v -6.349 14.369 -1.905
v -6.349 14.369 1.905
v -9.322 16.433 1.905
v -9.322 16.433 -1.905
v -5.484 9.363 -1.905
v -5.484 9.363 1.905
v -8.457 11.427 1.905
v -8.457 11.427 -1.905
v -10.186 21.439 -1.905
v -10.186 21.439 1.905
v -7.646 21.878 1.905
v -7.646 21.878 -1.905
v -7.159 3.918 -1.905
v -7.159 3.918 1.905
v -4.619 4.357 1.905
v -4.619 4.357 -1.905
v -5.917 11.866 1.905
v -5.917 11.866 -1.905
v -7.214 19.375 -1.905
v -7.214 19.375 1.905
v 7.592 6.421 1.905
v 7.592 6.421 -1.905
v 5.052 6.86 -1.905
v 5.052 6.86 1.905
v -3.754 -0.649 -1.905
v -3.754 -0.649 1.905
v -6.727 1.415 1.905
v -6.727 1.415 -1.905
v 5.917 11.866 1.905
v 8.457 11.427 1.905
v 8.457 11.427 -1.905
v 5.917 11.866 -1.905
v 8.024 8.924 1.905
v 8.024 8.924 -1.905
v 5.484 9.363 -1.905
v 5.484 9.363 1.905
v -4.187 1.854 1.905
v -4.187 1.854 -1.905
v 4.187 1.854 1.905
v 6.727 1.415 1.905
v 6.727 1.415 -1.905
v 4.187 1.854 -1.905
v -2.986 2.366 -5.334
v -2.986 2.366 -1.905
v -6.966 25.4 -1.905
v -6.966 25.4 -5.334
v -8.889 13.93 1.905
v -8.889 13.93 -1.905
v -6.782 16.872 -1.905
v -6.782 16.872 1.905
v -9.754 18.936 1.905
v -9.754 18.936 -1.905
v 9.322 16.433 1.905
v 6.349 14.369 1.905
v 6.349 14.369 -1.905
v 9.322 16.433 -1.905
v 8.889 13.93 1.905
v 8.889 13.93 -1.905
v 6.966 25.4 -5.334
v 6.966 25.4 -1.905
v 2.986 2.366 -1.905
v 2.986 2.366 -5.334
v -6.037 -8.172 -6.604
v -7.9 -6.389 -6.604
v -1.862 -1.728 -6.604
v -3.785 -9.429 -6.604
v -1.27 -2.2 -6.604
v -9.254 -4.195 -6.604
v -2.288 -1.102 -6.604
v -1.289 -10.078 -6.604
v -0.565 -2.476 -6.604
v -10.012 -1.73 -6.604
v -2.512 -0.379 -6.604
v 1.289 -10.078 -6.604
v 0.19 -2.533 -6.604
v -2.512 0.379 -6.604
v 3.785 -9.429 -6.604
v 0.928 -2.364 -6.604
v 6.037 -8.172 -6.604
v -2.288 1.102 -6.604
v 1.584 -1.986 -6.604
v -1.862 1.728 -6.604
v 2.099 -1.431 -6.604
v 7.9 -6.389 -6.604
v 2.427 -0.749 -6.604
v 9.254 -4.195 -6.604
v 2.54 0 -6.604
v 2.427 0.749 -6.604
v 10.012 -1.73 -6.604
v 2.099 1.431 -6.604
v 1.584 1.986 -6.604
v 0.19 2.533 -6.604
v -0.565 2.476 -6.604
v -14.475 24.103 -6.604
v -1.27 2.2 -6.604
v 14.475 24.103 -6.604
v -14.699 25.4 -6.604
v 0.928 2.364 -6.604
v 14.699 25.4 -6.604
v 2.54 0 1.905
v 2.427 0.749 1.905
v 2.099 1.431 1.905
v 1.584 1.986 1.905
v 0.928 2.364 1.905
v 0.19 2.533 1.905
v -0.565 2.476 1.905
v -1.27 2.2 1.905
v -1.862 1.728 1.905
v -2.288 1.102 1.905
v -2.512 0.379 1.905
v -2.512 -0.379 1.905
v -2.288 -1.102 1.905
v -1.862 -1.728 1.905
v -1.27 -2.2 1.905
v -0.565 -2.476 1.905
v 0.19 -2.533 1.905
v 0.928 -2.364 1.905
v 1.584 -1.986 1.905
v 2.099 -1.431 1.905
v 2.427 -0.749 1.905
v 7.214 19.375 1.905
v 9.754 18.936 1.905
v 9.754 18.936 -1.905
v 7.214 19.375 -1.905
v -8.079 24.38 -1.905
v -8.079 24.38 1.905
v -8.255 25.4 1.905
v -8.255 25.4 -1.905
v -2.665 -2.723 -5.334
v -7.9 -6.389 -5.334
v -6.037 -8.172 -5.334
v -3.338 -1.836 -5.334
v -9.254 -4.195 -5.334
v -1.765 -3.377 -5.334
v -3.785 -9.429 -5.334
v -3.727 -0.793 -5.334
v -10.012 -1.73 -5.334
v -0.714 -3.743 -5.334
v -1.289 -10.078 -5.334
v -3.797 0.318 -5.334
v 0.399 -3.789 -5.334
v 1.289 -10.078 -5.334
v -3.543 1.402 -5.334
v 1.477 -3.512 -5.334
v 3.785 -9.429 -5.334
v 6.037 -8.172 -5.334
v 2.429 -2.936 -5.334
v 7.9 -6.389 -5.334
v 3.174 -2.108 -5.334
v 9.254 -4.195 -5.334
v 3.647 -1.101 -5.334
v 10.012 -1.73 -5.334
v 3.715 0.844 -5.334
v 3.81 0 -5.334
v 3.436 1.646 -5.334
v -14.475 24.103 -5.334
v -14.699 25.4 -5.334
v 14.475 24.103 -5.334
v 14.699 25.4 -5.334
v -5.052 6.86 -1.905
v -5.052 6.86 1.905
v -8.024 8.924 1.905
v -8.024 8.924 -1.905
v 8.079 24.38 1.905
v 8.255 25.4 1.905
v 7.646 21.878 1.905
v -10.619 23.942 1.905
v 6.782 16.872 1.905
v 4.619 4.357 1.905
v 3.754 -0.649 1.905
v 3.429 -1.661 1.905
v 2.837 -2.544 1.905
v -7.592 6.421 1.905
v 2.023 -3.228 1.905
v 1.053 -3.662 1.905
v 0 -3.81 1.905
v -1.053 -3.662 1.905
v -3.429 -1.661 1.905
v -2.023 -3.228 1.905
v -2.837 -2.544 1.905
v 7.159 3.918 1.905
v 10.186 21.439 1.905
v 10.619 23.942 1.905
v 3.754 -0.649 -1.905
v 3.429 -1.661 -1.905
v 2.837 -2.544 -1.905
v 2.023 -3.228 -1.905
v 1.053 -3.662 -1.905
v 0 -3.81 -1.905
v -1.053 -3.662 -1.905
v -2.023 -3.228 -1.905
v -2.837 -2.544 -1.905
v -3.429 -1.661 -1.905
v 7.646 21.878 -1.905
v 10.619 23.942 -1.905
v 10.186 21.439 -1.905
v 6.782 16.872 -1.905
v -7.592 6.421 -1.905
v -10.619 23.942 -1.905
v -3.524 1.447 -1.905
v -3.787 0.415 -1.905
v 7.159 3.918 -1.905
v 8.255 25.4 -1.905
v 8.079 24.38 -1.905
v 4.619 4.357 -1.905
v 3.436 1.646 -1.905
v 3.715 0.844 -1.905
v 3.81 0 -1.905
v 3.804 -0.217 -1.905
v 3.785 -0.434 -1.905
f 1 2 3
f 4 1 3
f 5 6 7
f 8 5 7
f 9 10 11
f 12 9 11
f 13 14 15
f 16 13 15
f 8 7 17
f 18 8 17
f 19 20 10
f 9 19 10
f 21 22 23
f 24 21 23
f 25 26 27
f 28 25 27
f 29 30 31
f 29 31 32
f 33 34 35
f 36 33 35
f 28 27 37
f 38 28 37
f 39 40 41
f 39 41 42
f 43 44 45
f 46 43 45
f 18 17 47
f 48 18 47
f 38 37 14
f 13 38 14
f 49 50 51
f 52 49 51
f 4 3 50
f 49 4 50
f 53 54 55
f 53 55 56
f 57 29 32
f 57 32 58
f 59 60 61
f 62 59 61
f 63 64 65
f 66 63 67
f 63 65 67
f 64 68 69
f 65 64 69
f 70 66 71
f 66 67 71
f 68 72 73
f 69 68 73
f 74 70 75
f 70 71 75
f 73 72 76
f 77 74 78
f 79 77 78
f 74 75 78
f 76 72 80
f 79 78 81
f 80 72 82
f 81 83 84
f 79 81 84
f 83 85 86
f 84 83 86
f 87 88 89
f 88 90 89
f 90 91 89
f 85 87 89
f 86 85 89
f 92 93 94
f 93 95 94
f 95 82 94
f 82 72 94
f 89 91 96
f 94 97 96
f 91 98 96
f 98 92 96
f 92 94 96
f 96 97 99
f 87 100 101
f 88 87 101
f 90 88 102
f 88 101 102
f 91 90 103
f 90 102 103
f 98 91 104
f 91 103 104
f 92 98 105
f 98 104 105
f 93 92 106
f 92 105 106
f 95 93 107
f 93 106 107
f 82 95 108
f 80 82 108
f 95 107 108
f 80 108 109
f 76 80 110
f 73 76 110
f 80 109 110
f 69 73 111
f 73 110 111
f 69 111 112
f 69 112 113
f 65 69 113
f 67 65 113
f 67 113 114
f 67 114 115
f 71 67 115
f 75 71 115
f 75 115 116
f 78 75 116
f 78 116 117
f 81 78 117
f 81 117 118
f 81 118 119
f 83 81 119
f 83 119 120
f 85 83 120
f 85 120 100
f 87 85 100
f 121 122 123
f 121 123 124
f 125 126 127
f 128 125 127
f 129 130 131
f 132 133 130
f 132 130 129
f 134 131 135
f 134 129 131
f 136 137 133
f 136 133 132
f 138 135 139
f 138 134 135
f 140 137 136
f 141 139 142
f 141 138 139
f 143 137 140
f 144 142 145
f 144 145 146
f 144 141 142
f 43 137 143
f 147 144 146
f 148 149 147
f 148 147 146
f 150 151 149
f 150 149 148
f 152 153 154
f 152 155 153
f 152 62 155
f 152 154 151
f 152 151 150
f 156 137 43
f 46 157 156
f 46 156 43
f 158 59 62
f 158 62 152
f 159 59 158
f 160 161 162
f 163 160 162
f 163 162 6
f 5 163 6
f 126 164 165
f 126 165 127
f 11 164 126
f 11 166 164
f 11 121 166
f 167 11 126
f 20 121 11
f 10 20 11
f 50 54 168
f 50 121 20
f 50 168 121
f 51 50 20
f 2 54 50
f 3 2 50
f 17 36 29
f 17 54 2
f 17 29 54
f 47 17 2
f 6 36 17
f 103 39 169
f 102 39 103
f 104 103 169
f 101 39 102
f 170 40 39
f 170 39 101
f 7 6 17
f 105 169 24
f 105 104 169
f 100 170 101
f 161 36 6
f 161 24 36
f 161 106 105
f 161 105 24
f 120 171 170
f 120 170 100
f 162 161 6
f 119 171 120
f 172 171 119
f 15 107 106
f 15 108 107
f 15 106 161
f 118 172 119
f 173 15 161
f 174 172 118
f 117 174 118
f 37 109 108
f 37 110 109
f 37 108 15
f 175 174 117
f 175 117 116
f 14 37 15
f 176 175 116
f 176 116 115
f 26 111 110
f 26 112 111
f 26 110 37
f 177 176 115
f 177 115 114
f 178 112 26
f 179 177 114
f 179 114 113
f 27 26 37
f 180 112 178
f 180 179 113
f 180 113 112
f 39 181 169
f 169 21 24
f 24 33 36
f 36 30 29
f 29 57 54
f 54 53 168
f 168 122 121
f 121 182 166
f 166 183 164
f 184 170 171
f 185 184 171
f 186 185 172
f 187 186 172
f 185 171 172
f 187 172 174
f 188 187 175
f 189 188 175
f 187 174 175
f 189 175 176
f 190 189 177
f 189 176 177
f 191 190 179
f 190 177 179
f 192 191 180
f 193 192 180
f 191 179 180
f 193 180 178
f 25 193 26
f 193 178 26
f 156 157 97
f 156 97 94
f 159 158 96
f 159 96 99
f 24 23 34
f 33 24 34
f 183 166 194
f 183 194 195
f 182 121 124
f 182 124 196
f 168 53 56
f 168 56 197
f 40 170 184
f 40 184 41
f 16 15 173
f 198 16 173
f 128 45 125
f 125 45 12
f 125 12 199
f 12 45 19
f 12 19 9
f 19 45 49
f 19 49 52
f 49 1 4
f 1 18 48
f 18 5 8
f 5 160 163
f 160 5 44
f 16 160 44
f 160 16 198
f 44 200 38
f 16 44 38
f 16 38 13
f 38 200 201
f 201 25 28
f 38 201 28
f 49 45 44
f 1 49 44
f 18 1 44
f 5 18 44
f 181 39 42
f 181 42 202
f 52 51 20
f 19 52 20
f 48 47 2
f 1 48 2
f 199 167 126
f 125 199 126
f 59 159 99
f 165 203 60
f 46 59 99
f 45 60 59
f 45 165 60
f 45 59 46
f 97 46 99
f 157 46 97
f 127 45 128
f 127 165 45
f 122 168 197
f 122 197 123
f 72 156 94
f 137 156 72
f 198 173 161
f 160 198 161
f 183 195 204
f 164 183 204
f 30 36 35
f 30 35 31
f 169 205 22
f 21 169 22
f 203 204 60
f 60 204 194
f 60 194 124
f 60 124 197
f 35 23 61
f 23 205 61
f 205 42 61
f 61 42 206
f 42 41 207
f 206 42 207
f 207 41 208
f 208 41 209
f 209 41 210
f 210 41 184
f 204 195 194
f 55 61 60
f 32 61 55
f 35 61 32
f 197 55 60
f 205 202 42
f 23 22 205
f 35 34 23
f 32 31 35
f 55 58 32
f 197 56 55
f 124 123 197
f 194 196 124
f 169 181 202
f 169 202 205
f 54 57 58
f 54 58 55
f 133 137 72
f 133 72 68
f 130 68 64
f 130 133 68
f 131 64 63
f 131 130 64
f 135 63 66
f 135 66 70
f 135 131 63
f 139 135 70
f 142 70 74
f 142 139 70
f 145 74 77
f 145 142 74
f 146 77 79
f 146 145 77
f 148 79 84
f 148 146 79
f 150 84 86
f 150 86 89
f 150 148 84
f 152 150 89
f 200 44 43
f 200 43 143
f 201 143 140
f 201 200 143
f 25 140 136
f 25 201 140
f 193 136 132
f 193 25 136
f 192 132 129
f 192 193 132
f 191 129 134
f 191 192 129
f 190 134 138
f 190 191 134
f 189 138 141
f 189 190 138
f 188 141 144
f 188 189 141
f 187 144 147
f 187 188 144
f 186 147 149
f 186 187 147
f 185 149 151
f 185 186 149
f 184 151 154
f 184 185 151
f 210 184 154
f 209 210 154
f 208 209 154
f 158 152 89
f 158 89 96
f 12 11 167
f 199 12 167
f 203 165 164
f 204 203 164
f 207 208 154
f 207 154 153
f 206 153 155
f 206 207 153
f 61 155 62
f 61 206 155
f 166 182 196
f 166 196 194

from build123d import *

# Parameters (mm, degrees)
BOSS_EXTRUDE1_DEPTH  = 1.905
BOSS_EXTRUDE3_DEPTH  = 3.429
BOSS_EXTRUDE2_DEPTH  = 3.81
LPATTERN1_COUNT      = 10
LPATTERN1_PITCH      = 2.54
MIRROR1_COPY_1_DEPTH = 3.81
MIRROR1_COPY_2_DEPTH = 3.81
MIRROR1_COPY_3_DEPTH = 3.81
MIRROR1_COPY_4_DEPTH = 3.81
MIRROR1_COPY_5_DEPTH = 3.81
MIRROR1_COPY_6_DEPTH = 3.81
MIRROR1_COPY_7_DEPTH = 3.81
MIRROR1_COPY_8_DEPTH = 3.81
MIRROR1_COPY_9_DEPTH = 3.81
BOSS_EXTRUDE4_DEPTH  = 1.27
SKETCH5_R            = 2.54
CUT_EXTRUDE1_DEPTH   = 31.555296323
SKETCH6_R            = 3.81
SKETCH6_R_2          = 2.54
BOSS_EXTRUDE5_DEPTH  = 7.62


with BuildPart() as part:
    # Sketch1 → Boss-Extrude1 (new, symmetric)
    with BuildSketch(Plane.XY):
        with BuildLine():
            Line((-3.754374137, -0.648671595), (-8.255, 25.4))
            Line((-8.255, 25.4), (8.255, 25.4))
            Line((8.255, 25.4), (3.754374137, -0.648671595))
            ThreePointArc((3.754374137, -0.648671595), (0, -3.81), (-3.754374137, -0.648671595))
        make_face()
    extrude(amount=BOSS_EXTRUDE1_DEPTH, both=True)

    # Sketch3 → Boss-Extrude3 (add)
    with BuildSketch(Plane(origin=(0, 0, -1.905), x_dir=(-1, 0, 0), z_dir=(0, 0, -1))):
        with BuildLine():
            Line((6.966183323, 25.4), (-6.966183323, 25.4))
            Line((-6.966183323, 25.4), (-2.502916091, -0.43244773))
            ThreePointArc((-2.502916091, -0.43244773), (0, -2.54), (2.502916091, -0.43244773))
            Line((2.502916091, -0.43244773), (6.966183323, 25.4))
        make_face()
    extrude(amount=BOSS_EXTRUDE3_DEPTH)

    # Sketch2 → Boss-Extrude2 (add)
    with BuildSketch(Plane.XY.offset(1.905)):
        Polygon((-3.754374137, -0.648671595), (-6.726821867, 1.4153895), (-4.186821867, 1.854244497), align=None)
    boss_extrude2 = extrude(amount=-BOSS_EXTRUDE2_DEPTH)

    # LPattern1: Boss-Extrude2 ×10
    with Locations(*[Vector(-0.17025501170659457, 0.9854000360202892, 0) * (i * LPATTERN1_PITCH) for i in range(1, LPATTERN1_COUNT)]):
        add(boss_extrude2)

    # Mirror1: Boss-Extrude2 across plane
    add(boss_extrude2.mirror(Plane(origin=(0, 0, 0), x_dir=(0, 0, 1), z_dir=(1, 0, 0))))

    # Mirror1 copy 1 sketch → Mirror1 copy 1 (add)
    with BuildSketch(Plane(origin=(0.43244773, 2.502916091, 1.905), x_dir=(-1, 0, 0), z_dir=(0, 0, 1))):
        Polygon((-3.754374137, 0.648671595), (-6.726821867, -1.4153895), (-4.186821867, -1.854244497), align=None)
    extrude(amount=-MIRROR1_COPY_1_DEPTH)

    # Mirror1 copy 2 sketch → Mirror1 copy 2 (add)
    with BuildSketch(Plane(origin=(0.864895459, 5.005832183, 1.905), x_dir=(-1, 0, 0), z_dir=(0, 0, 1))):
        Polygon((-3.754374137, 0.648671595), (-6.726821867, -1.4153895), (-4.186821867, -1.854244497), align=None)
    extrude(amount=-MIRROR1_COPY_2_DEPTH)

    # Mirror1 copy 3 sketch → Mirror1 copy 3 (add)
    with BuildSketch(Plane(origin=(1.297343189, 7.508748274, 1.905), x_dir=(-1, 0, 0), z_dir=(0, 0, 1))):
        Polygon((-3.754374137, 0.648671595), (-6.726821867, -1.4153895), (-4.186821867, -1.854244497), align=None)
    extrude(amount=-MIRROR1_COPY_3_DEPTH)

    # Mirror1 copy 4 sketch → Mirror1 copy 4 (add)
    with BuildSketch(Plane(origin=(1.729790919, 10.011664366, 1.905), x_dir=(-1, 0, 0), z_dir=(0, 0, 1))):
        Polygon((-3.754374137, 0.648671595), (-6.726821867, -1.4153895), (-4.186821867, -1.854244497), align=None)
    extrude(amount=-MIRROR1_COPY_4_DEPTH)

    # Mirror1 copy 5 sketch → Mirror1 copy 5 (add)
    with BuildSketch(Plane(origin=(2.162238649, 12.514580457, 1.905), x_dir=(-1, 0, 0), z_dir=(0, 0, 1))):
        Polygon((-3.754374137, 0.648671595), (-6.726821867, -1.4153895), (-4.186821867, -1.854244497), align=None)
    extrude(amount=-MIRROR1_COPY_5_DEPTH)

    # Mirror1 copy 6 sketch → Mirror1 copy 6 (add)
    with BuildSketch(Plane(origin=(2.594686378, 15.017496549, 1.905), x_dir=(-1, 0, 0), z_dir=(0, 0, 1))):
        Polygon((-3.754374137, 0.648671595), (-6.726821867, -1.4153895), (-4.186821867, -1.854244497), align=None)
    extrude(amount=-MIRROR1_COPY_6_DEPTH)

    # Mirror1 copy 7 sketch → Mirror1 copy 7 (add)
    with BuildSketch(Plane(origin=(3.027134108, 17.52041264, 1.905), x_dir=(-1, 0, 0), z_dir=(0, 0, 1))):
        Polygon((-3.754374137, 0.648671595), (-6.726821867, -1.4153895), (-4.186821867, -1.854244497), align=None)
    extrude(amount=-MIRROR1_COPY_7_DEPTH)

    # Mirror1 copy 8 sketch → Mirror1 copy 8 (add)
    with BuildSketch(Plane(origin=(3.459581838, 20.023328732, 1.905), x_dir=(-1, 0, 0), z_dir=(0, 0, 1))):
        Polygon((-3.754374137, 0.648671595), (-6.726821867, -1.4153895), (-4.186821867, -1.854244497), align=None)
    extrude(amount=-MIRROR1_COPY_8_DEPTH)

    # Mirror1 copy 9 sketch → Mirror1 copy 9 (add)
    with BuildSketch(Plane(origin=(3.892029568, 22.526244823, 1.905), x_dir=(-1, 0, 0), z_dir=(0, 0, 1))):
        Polygon((-3.754374137, 0.648671595), (-6.726821867, -1.4153895), (-4.186821867, -1.854244497), align=None)
    extrude(amount=-MIRROR1_COPY_9_DEPTH)

    # Sketch4 → Boss-Extrude4 (add)
    with BuildSketch(Plane(origin=(0, 0, -5.334), x_dir=(-1, 0, 0), z_dir=(0, 0, -1))):
        with BuildLine():
            Line((-14.699083385, 25.4), (14.699083385, 25.4))
            Line((14.699083385, 25.4), (14.474931597, 24.102656811))
            Line((14.474931597, 24.102656811), (10.011664366, -1.729790919))
            ThreePointArc((10.011664366, -1.729790919), (0, -10.16), (-10.011664366, -1.729790919))
            Line((-10.011664366, -1.729790919), (-14.474931597, 24.102656811))
            Line((-14.474931597, 24.102656811), (-14.699083385, 25.4))
        make_face()
    extrude(amount=BOSS_EXTRUDE4_DEPTH)

    # Sketch5 → Cut-Extrude1 (cut, through all)
    with BuildSketch(Plane.XY.offset(1.905)):
        Circle(SKETCH5_R)
    extrude(amount=-CUT_EXTRUDE1_DEPTH, mode=Mode.SUBTRACT)

    # Sketch6 → Boss-Extrude5 (add)
    with BuildSketch(Plane.XY.offset(1.905)):
        Circle(SKETCH6_R)
        Circle(SKETCH6_R_2, mode=Mode.SUBTRACT)
    extrude(amount=-BOSS_EXTRUDE5_DEPTH)


solid = part.part
